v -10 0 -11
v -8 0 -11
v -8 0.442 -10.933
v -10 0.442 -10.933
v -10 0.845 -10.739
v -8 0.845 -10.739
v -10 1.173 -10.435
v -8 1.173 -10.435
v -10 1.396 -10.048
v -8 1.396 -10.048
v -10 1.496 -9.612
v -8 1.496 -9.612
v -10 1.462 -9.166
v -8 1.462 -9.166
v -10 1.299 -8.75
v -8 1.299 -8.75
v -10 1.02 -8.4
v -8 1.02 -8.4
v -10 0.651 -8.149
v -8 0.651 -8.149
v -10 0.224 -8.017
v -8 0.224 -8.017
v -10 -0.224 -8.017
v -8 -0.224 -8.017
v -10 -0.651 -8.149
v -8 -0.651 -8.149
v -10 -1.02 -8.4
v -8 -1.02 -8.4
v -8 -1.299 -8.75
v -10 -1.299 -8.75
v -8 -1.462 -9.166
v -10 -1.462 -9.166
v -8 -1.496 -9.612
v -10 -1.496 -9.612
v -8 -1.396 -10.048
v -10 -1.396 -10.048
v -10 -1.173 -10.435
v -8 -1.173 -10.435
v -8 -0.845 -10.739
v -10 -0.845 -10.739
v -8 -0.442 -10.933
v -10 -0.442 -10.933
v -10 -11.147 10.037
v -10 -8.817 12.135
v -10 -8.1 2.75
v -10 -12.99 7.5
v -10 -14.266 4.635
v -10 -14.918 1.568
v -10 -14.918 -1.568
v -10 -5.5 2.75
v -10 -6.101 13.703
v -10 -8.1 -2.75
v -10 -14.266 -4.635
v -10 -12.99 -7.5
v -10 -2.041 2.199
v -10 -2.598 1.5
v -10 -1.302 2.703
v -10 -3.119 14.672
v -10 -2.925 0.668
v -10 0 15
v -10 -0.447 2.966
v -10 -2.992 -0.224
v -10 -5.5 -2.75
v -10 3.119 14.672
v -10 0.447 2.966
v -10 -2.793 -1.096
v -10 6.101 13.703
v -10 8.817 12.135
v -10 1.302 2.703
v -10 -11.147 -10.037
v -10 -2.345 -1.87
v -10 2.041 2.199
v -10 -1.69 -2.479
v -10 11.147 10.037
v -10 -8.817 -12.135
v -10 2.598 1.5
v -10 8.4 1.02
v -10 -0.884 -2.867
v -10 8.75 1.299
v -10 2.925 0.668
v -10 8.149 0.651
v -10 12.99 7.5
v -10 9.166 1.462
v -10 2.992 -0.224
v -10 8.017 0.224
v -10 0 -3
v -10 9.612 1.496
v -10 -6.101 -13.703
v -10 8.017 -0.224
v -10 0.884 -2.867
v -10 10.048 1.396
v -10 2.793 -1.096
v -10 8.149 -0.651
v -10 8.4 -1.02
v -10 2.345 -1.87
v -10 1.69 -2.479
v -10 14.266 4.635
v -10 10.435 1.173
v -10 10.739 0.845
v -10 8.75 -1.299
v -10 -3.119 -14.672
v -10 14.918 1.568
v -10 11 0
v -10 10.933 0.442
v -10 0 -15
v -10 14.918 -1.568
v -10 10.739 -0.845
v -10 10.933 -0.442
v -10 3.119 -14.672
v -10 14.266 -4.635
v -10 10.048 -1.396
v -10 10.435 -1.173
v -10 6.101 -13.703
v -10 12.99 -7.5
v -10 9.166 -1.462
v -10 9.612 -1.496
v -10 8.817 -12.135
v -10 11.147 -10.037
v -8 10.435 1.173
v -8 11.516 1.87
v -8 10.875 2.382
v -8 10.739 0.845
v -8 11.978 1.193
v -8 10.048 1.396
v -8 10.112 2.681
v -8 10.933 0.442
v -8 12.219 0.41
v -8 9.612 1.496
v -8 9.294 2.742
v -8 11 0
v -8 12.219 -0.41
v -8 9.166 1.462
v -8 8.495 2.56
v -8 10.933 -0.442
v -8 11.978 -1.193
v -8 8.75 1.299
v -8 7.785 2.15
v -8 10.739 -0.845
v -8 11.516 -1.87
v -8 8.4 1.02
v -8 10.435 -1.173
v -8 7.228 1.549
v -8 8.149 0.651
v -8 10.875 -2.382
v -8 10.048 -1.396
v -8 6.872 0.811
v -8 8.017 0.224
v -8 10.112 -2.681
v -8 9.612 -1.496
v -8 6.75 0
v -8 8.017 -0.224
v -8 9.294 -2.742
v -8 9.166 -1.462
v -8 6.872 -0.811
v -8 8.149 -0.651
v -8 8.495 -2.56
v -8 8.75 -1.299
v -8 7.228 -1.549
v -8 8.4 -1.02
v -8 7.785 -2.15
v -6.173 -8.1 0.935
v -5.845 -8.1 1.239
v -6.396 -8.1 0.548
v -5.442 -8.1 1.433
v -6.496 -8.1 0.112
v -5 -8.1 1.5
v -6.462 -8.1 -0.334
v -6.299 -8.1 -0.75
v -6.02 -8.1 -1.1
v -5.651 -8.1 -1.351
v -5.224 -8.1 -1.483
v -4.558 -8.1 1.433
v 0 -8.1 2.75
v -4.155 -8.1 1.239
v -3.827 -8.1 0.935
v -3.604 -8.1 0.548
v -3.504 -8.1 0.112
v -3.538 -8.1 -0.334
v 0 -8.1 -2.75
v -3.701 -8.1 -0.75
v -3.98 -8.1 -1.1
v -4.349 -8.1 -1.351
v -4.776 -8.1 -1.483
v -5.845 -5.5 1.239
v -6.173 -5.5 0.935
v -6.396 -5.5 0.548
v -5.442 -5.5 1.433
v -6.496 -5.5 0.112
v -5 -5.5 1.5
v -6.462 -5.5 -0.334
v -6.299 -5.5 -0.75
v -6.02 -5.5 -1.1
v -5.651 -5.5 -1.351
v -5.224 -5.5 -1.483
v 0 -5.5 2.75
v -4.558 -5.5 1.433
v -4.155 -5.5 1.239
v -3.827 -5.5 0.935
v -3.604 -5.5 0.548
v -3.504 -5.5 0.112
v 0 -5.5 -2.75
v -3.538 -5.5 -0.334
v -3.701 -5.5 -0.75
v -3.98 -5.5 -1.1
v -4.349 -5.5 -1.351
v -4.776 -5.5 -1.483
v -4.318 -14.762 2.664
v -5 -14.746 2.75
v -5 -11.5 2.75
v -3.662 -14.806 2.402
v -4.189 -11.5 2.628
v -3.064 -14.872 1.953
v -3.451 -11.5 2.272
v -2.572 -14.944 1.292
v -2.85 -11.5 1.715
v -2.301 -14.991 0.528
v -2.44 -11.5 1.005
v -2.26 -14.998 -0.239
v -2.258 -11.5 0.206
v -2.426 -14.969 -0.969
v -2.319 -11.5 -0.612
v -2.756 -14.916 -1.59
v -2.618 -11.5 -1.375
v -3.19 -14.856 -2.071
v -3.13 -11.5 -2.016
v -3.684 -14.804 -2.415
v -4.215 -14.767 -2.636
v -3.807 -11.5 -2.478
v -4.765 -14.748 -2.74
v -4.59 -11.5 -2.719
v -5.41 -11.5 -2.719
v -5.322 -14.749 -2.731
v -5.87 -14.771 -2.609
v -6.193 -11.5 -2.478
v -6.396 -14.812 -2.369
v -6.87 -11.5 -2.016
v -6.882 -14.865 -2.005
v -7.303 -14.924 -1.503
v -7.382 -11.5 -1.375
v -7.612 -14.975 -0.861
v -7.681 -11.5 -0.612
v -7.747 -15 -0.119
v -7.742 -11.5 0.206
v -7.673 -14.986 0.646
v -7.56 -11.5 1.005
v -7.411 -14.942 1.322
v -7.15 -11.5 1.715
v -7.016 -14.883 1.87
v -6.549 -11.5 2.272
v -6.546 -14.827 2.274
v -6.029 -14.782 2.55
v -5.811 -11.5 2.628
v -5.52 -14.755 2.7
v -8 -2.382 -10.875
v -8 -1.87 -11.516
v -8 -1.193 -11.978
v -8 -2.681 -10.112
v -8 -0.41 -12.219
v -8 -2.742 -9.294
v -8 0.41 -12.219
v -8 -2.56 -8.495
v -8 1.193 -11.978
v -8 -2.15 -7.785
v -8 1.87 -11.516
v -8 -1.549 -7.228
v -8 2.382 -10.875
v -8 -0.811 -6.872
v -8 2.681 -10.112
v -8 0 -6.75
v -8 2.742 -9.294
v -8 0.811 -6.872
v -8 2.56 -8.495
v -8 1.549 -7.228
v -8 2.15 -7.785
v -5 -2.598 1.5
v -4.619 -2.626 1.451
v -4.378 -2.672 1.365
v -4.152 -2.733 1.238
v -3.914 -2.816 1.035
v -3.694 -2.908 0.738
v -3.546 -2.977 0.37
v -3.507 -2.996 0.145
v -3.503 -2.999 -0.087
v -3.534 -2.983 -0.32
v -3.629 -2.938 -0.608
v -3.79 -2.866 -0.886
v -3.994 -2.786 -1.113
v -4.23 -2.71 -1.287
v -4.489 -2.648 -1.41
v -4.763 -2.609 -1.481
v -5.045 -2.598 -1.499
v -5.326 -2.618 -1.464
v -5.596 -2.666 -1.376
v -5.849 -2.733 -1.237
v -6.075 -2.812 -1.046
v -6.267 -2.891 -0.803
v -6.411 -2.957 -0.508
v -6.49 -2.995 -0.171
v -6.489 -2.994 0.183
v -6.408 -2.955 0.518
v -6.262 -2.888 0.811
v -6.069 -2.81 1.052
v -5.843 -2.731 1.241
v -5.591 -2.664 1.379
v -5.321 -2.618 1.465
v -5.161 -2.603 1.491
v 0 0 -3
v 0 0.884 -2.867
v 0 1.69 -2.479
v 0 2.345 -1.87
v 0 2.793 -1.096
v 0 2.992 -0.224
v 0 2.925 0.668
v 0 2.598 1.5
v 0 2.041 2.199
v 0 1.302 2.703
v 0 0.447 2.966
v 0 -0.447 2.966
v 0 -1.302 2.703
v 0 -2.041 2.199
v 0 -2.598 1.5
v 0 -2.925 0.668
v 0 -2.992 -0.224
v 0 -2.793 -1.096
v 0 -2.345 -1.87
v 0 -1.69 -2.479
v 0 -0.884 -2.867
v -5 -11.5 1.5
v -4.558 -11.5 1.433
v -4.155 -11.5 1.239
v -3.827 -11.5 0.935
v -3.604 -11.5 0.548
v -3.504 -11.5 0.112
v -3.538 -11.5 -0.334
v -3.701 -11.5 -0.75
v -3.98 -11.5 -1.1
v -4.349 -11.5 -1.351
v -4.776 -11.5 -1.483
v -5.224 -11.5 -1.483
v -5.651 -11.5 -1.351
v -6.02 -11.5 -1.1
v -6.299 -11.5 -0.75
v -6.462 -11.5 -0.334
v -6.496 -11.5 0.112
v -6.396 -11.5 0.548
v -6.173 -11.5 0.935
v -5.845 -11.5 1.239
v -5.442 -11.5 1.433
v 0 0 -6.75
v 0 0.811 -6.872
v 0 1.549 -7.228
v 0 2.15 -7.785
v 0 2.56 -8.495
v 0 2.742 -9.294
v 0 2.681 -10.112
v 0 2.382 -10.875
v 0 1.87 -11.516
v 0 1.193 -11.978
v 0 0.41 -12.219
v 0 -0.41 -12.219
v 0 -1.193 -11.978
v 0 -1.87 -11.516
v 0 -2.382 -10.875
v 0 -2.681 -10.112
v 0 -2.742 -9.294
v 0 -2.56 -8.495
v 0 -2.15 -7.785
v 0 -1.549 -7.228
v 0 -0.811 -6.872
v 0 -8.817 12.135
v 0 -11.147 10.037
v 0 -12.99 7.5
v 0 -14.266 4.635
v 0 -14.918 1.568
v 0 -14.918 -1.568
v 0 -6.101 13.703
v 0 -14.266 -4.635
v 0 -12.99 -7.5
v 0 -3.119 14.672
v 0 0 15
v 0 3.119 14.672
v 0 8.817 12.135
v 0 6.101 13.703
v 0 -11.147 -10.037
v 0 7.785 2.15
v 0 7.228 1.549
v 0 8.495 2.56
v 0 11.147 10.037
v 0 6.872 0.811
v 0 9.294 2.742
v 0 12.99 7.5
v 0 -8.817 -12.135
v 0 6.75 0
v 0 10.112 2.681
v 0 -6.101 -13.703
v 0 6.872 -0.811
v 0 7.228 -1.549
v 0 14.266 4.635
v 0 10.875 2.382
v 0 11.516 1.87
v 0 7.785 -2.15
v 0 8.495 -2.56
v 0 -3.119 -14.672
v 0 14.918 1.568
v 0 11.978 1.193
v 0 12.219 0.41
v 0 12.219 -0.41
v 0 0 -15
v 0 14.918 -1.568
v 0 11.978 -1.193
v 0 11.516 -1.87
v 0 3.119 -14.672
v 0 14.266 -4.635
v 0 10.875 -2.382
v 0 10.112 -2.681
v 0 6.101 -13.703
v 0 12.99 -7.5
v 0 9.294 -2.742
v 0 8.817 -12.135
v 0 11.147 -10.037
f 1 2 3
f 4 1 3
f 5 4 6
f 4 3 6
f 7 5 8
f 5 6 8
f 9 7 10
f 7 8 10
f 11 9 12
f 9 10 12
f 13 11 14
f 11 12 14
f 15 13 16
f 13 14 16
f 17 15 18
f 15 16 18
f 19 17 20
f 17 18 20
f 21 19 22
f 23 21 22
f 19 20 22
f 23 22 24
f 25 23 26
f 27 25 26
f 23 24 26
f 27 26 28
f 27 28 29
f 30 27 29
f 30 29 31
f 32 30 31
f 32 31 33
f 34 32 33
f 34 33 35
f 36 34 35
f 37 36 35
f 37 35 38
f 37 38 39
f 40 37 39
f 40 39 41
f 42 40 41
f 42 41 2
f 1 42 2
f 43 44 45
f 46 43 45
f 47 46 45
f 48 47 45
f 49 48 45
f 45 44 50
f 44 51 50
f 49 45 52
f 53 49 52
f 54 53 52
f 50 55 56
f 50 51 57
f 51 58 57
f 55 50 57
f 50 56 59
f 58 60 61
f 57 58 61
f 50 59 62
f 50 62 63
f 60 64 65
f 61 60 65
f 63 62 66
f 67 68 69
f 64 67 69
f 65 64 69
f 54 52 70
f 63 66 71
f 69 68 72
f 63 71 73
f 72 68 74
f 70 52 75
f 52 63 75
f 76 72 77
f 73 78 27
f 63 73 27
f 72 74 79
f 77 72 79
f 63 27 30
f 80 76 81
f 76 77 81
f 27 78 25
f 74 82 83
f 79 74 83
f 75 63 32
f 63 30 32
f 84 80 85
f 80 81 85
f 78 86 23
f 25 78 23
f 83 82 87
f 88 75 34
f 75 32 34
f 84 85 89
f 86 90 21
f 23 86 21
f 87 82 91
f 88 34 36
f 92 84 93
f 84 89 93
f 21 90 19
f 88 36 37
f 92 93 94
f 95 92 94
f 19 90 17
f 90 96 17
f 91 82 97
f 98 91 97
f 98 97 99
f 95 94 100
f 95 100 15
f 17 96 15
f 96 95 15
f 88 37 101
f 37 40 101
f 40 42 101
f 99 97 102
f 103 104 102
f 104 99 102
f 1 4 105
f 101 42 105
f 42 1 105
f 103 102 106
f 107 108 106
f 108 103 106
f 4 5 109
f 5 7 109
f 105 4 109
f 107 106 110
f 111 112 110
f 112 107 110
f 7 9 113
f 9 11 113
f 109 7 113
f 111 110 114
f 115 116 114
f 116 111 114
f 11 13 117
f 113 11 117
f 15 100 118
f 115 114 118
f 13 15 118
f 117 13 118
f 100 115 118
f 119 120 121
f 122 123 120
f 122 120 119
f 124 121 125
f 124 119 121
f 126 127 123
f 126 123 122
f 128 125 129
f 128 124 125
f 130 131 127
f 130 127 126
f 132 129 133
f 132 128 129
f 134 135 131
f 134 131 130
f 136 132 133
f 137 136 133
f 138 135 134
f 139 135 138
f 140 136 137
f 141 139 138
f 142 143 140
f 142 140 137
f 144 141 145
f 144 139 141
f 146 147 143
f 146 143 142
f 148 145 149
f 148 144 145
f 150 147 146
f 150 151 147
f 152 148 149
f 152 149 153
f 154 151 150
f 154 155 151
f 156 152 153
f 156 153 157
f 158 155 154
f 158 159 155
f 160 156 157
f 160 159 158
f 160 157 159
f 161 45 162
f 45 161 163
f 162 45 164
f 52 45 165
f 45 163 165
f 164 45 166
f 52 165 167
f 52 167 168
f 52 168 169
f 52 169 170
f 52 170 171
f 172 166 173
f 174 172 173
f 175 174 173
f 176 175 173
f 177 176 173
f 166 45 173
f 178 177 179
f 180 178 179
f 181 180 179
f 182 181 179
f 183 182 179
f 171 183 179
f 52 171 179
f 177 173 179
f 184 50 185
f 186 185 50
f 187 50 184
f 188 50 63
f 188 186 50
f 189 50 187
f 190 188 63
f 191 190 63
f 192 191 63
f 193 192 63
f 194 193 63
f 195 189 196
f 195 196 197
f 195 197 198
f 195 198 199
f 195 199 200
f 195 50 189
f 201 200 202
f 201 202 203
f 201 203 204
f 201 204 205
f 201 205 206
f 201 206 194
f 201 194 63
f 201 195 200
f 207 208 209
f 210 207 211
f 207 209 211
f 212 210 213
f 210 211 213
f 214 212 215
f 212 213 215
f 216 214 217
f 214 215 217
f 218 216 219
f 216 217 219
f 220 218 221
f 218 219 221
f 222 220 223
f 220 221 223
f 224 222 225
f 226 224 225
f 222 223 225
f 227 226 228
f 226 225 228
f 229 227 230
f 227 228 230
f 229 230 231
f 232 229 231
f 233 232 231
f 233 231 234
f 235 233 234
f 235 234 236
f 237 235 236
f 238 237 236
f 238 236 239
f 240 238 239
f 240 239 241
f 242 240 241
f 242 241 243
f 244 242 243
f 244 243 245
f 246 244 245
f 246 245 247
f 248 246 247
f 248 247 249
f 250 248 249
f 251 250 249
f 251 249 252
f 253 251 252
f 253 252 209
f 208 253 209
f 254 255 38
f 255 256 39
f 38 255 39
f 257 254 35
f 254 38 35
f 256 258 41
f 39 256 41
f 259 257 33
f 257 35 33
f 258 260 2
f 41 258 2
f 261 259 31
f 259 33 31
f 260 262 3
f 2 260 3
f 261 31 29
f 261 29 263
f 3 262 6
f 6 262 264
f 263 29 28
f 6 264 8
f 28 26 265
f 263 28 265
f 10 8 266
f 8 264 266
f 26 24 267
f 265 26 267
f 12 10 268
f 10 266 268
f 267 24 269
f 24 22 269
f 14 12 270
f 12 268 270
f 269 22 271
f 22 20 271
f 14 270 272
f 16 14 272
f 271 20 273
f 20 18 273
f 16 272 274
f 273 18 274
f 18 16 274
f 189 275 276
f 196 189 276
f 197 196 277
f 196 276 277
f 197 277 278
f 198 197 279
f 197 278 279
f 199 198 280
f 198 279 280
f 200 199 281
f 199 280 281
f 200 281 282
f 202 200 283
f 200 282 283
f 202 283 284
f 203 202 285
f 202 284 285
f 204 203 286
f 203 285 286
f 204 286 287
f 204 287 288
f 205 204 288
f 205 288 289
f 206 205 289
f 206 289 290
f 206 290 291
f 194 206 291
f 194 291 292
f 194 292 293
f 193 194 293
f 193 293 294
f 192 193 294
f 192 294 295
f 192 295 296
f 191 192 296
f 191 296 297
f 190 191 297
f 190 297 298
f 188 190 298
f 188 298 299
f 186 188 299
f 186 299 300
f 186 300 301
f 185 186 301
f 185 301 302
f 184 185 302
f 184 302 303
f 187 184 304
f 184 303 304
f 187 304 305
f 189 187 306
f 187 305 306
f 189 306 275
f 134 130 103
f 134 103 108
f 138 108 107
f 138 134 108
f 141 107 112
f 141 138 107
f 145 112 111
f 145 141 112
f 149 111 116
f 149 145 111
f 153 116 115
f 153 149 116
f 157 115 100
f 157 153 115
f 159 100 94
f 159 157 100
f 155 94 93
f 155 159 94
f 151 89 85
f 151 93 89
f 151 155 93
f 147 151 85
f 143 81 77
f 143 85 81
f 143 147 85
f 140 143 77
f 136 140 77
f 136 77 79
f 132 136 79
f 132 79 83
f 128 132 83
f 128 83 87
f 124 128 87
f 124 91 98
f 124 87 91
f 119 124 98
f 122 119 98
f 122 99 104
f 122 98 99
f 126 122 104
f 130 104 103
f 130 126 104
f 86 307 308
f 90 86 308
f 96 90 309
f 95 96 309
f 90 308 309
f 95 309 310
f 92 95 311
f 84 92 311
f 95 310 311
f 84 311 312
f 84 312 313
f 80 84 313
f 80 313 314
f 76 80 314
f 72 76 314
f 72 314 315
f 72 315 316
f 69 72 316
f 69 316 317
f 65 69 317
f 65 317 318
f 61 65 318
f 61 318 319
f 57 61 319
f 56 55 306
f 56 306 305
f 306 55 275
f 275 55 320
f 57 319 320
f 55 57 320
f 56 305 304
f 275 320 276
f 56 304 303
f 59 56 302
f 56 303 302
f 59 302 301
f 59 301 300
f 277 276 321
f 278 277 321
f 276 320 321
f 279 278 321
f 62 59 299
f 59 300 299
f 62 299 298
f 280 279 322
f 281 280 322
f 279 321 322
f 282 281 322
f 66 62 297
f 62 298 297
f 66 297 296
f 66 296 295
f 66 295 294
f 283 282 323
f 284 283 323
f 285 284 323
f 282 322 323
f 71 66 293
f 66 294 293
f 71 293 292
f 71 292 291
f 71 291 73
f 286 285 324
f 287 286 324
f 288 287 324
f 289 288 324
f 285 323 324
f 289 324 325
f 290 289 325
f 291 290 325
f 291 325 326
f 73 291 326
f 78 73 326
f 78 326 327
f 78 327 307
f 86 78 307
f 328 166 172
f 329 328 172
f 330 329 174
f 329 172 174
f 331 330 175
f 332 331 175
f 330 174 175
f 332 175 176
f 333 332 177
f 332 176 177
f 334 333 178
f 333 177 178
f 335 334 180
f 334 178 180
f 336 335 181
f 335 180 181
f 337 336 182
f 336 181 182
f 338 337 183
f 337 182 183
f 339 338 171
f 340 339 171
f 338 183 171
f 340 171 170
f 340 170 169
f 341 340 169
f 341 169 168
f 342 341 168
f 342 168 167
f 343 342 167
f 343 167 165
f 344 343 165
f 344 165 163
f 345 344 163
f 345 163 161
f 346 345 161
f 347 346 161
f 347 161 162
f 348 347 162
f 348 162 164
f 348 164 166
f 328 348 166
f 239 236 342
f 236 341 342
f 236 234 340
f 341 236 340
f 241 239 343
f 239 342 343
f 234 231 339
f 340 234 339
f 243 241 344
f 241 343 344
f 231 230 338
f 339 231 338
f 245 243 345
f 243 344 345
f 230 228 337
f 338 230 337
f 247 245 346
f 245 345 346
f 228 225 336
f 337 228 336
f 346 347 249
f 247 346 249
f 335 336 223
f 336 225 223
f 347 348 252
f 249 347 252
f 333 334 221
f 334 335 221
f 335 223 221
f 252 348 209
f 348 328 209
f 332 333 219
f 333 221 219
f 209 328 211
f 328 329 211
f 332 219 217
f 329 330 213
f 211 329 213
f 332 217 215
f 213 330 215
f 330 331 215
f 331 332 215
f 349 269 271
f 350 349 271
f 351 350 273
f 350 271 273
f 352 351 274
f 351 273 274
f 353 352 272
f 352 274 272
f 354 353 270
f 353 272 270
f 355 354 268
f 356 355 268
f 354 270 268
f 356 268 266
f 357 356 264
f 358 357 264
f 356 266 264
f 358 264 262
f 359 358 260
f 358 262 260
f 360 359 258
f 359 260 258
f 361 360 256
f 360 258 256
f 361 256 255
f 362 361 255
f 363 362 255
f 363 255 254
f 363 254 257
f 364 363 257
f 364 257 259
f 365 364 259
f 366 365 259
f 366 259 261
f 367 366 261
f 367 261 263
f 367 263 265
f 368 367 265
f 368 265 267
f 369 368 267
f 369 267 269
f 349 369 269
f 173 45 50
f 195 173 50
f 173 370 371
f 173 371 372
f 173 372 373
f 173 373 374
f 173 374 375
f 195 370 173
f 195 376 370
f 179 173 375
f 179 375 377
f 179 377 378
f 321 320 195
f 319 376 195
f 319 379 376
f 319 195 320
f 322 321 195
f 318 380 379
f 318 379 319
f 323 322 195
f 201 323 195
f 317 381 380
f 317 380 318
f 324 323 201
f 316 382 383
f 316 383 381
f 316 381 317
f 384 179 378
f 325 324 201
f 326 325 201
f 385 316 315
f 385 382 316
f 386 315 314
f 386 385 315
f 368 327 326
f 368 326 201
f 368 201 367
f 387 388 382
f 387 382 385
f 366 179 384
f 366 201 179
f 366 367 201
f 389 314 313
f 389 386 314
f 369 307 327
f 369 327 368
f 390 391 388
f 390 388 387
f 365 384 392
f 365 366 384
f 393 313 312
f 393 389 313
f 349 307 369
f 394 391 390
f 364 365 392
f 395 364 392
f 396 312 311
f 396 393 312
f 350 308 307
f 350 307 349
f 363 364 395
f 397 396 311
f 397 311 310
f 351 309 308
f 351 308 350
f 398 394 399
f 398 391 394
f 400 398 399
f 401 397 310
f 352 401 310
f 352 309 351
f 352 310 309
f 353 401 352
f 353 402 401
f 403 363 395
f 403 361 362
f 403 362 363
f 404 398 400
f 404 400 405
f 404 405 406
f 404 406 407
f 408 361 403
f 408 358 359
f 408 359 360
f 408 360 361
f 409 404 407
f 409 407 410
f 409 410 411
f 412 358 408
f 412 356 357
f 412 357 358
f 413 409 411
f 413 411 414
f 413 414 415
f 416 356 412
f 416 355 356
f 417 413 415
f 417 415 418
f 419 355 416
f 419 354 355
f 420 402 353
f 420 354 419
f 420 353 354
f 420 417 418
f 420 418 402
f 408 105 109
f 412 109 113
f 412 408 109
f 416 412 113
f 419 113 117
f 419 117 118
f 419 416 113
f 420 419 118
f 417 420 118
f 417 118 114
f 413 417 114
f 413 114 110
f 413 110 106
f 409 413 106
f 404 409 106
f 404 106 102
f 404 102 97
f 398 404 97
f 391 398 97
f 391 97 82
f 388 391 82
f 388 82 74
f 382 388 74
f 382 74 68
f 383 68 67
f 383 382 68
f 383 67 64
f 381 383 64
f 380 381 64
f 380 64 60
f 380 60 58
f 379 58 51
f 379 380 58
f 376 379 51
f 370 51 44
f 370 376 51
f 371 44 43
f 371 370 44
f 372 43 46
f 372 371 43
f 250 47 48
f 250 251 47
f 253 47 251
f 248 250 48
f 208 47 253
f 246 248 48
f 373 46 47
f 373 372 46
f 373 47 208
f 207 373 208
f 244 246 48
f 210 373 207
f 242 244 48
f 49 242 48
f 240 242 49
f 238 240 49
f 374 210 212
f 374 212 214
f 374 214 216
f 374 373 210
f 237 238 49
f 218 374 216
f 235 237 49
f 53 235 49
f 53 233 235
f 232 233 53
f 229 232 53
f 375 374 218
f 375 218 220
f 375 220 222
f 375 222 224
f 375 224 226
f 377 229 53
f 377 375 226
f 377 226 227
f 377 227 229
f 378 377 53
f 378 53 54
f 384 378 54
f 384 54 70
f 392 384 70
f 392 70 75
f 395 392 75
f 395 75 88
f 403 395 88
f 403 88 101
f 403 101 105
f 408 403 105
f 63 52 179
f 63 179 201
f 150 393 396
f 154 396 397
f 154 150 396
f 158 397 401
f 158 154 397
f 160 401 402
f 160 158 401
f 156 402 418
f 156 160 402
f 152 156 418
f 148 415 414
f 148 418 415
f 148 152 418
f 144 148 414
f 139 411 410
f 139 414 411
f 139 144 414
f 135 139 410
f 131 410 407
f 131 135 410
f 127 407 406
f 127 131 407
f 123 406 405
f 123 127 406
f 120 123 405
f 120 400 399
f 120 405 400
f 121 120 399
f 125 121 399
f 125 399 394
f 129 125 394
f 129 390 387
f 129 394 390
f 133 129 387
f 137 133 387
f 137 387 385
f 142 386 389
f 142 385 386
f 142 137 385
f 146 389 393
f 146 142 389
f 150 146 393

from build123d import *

# Parameters (mm, degrees)
CROQUIS2_R              = 15
CROQUIS2_R_2            = 3
SALIENTE_EXTRUIR1_DEPTH = 10
CROQUIS3_R              = 1.5
CORTAR_EXTRUIR1_DEPTH   = 24.452078799
CROQUIS6_W              = 5.5
CROQUIS6_H              = 2.6
CORTAR_EXTRUIR2_DEPTH   = 24.452078988
CORTAR_EXTRUIR3_START   = -11.5
CROQUIS7_R              = 2.75
CORTAR_EXTRUIR3_DEPTH   = 12.952078988
CROQUIS9_R              = 1.5
CORTAR_EXTRUIR4_DEPTH   = 24.45207897
CORTAR_EXTRUIR5_START   = -2
CROQUIS11_R             = 2.75
CORTAR_EXTRUIR5_DEPTH   = 22.45207897


with BuildPart() as part:
    # Croquis2 → Saliente-Extruir1 (new body)
    with BuildSketch(Plane(origin=(0, 0, 0), x_dir=(0, 0, -1), z_dir=(1, 0, 0))):
        Circle(CROQUIS2_R)
        Circle(CROQUIS2_R_2, mode=Mode.SUBTRACT)
    extrude(amount=-SALIENTE_EXTRUIR1_DEPTH)

    # Croquis3 → Cortar-Extruir1 (cut, through all)
    with BuildSketch(Plane(origin=(0, 0, 0), x_dir=(1, 0, 0), z_dir=(0, 1, 0))):
        with Locations((-5, 0)):
            Circle(CROQUIS3_R)
    extrude(amount=-CORTAR_EXTRUIR1_DEPTH, mode=Mode.SUBTRACT)

    # Croquis6 → Cortar-Extruir2 (cut, through all)
    with BuildSketch(Plane(origin=(0, 0, 0), x_dir=(0, 0, -1), z_dir=(1, 0, 0))):
        with Locations((0, -6.8)):
            Rectangle(CROQUIS6_W, CROQUIS6_H)
    extrude(amount=-CORTAR_EXTRUIR2_DEPTH, mode=Mode.SUBTRACT)

    # Croquis7 → Cortar-Extruir3 (cut, through all)
    with BuildSketch(Plane(origin=(0, 0, 0), x_dir=(1, 0, 0), z_dir=(0, 1, 0)).offset(CORTAR_EXTRUIR3_START)):
        with Locations((-5, 0)):
            Circle(CROQUIS7_R)
    extrude(amount=-CORTAR_EXTRUIR3_DEPTH, mode=Mode.SUBTRACT)

    # Croquis9 → Cortar-Extruir4 (cut, through all)
    with BuildSketch(Plane(origin=(0, 0, 0), x_dir=(0, 0, -1), z_dir=(1, 0, 0))):
        with Locations((9.5, 0)):
            Circle(CROQUIS9_R)
    cortar_extruir4 = extrude(amount=-CORTAR_EXTRUIR4_DEPTH, mode=Mode.SUBTRACT)

    # Croquis11 → Cortar-Extruir5 (cut, through all)
    with BuildSketch(Plane.ZY.offset(10).offset(CORTAR_EXTRUIR5_START)):
        with Locations((-9.5, 0)):
            Circle(CROQUIS11_R)
    cortar_extruir5 = extrude(amount=-CORTAR_EXTRUIR5_DEPTH, mode=Mode.SUBTRACT)

    # Simetría1: Cortar-Extruir4, Cortar-Extruir5 across plane
    add(cortar_extruir4.mirror(Plane(origin=(0, 0, 0), x_dir=(0, -0.7071067811865489, 0.7071067811865462), z_dir=(0, 0.7071067811865464, 0.7071067811865488))), mode=Mode.SUBTRACT)
    add(cortar_extruir5.mirror(Plane(origin=(0, 0, 0), x_dir=(0, -0.7071067811865489, 0.7071067811865462), z_dir=(0, 0.7071067811865464, 0.7071067811865488))), mode=Mode.SUBTRACT)


solid = part.part
